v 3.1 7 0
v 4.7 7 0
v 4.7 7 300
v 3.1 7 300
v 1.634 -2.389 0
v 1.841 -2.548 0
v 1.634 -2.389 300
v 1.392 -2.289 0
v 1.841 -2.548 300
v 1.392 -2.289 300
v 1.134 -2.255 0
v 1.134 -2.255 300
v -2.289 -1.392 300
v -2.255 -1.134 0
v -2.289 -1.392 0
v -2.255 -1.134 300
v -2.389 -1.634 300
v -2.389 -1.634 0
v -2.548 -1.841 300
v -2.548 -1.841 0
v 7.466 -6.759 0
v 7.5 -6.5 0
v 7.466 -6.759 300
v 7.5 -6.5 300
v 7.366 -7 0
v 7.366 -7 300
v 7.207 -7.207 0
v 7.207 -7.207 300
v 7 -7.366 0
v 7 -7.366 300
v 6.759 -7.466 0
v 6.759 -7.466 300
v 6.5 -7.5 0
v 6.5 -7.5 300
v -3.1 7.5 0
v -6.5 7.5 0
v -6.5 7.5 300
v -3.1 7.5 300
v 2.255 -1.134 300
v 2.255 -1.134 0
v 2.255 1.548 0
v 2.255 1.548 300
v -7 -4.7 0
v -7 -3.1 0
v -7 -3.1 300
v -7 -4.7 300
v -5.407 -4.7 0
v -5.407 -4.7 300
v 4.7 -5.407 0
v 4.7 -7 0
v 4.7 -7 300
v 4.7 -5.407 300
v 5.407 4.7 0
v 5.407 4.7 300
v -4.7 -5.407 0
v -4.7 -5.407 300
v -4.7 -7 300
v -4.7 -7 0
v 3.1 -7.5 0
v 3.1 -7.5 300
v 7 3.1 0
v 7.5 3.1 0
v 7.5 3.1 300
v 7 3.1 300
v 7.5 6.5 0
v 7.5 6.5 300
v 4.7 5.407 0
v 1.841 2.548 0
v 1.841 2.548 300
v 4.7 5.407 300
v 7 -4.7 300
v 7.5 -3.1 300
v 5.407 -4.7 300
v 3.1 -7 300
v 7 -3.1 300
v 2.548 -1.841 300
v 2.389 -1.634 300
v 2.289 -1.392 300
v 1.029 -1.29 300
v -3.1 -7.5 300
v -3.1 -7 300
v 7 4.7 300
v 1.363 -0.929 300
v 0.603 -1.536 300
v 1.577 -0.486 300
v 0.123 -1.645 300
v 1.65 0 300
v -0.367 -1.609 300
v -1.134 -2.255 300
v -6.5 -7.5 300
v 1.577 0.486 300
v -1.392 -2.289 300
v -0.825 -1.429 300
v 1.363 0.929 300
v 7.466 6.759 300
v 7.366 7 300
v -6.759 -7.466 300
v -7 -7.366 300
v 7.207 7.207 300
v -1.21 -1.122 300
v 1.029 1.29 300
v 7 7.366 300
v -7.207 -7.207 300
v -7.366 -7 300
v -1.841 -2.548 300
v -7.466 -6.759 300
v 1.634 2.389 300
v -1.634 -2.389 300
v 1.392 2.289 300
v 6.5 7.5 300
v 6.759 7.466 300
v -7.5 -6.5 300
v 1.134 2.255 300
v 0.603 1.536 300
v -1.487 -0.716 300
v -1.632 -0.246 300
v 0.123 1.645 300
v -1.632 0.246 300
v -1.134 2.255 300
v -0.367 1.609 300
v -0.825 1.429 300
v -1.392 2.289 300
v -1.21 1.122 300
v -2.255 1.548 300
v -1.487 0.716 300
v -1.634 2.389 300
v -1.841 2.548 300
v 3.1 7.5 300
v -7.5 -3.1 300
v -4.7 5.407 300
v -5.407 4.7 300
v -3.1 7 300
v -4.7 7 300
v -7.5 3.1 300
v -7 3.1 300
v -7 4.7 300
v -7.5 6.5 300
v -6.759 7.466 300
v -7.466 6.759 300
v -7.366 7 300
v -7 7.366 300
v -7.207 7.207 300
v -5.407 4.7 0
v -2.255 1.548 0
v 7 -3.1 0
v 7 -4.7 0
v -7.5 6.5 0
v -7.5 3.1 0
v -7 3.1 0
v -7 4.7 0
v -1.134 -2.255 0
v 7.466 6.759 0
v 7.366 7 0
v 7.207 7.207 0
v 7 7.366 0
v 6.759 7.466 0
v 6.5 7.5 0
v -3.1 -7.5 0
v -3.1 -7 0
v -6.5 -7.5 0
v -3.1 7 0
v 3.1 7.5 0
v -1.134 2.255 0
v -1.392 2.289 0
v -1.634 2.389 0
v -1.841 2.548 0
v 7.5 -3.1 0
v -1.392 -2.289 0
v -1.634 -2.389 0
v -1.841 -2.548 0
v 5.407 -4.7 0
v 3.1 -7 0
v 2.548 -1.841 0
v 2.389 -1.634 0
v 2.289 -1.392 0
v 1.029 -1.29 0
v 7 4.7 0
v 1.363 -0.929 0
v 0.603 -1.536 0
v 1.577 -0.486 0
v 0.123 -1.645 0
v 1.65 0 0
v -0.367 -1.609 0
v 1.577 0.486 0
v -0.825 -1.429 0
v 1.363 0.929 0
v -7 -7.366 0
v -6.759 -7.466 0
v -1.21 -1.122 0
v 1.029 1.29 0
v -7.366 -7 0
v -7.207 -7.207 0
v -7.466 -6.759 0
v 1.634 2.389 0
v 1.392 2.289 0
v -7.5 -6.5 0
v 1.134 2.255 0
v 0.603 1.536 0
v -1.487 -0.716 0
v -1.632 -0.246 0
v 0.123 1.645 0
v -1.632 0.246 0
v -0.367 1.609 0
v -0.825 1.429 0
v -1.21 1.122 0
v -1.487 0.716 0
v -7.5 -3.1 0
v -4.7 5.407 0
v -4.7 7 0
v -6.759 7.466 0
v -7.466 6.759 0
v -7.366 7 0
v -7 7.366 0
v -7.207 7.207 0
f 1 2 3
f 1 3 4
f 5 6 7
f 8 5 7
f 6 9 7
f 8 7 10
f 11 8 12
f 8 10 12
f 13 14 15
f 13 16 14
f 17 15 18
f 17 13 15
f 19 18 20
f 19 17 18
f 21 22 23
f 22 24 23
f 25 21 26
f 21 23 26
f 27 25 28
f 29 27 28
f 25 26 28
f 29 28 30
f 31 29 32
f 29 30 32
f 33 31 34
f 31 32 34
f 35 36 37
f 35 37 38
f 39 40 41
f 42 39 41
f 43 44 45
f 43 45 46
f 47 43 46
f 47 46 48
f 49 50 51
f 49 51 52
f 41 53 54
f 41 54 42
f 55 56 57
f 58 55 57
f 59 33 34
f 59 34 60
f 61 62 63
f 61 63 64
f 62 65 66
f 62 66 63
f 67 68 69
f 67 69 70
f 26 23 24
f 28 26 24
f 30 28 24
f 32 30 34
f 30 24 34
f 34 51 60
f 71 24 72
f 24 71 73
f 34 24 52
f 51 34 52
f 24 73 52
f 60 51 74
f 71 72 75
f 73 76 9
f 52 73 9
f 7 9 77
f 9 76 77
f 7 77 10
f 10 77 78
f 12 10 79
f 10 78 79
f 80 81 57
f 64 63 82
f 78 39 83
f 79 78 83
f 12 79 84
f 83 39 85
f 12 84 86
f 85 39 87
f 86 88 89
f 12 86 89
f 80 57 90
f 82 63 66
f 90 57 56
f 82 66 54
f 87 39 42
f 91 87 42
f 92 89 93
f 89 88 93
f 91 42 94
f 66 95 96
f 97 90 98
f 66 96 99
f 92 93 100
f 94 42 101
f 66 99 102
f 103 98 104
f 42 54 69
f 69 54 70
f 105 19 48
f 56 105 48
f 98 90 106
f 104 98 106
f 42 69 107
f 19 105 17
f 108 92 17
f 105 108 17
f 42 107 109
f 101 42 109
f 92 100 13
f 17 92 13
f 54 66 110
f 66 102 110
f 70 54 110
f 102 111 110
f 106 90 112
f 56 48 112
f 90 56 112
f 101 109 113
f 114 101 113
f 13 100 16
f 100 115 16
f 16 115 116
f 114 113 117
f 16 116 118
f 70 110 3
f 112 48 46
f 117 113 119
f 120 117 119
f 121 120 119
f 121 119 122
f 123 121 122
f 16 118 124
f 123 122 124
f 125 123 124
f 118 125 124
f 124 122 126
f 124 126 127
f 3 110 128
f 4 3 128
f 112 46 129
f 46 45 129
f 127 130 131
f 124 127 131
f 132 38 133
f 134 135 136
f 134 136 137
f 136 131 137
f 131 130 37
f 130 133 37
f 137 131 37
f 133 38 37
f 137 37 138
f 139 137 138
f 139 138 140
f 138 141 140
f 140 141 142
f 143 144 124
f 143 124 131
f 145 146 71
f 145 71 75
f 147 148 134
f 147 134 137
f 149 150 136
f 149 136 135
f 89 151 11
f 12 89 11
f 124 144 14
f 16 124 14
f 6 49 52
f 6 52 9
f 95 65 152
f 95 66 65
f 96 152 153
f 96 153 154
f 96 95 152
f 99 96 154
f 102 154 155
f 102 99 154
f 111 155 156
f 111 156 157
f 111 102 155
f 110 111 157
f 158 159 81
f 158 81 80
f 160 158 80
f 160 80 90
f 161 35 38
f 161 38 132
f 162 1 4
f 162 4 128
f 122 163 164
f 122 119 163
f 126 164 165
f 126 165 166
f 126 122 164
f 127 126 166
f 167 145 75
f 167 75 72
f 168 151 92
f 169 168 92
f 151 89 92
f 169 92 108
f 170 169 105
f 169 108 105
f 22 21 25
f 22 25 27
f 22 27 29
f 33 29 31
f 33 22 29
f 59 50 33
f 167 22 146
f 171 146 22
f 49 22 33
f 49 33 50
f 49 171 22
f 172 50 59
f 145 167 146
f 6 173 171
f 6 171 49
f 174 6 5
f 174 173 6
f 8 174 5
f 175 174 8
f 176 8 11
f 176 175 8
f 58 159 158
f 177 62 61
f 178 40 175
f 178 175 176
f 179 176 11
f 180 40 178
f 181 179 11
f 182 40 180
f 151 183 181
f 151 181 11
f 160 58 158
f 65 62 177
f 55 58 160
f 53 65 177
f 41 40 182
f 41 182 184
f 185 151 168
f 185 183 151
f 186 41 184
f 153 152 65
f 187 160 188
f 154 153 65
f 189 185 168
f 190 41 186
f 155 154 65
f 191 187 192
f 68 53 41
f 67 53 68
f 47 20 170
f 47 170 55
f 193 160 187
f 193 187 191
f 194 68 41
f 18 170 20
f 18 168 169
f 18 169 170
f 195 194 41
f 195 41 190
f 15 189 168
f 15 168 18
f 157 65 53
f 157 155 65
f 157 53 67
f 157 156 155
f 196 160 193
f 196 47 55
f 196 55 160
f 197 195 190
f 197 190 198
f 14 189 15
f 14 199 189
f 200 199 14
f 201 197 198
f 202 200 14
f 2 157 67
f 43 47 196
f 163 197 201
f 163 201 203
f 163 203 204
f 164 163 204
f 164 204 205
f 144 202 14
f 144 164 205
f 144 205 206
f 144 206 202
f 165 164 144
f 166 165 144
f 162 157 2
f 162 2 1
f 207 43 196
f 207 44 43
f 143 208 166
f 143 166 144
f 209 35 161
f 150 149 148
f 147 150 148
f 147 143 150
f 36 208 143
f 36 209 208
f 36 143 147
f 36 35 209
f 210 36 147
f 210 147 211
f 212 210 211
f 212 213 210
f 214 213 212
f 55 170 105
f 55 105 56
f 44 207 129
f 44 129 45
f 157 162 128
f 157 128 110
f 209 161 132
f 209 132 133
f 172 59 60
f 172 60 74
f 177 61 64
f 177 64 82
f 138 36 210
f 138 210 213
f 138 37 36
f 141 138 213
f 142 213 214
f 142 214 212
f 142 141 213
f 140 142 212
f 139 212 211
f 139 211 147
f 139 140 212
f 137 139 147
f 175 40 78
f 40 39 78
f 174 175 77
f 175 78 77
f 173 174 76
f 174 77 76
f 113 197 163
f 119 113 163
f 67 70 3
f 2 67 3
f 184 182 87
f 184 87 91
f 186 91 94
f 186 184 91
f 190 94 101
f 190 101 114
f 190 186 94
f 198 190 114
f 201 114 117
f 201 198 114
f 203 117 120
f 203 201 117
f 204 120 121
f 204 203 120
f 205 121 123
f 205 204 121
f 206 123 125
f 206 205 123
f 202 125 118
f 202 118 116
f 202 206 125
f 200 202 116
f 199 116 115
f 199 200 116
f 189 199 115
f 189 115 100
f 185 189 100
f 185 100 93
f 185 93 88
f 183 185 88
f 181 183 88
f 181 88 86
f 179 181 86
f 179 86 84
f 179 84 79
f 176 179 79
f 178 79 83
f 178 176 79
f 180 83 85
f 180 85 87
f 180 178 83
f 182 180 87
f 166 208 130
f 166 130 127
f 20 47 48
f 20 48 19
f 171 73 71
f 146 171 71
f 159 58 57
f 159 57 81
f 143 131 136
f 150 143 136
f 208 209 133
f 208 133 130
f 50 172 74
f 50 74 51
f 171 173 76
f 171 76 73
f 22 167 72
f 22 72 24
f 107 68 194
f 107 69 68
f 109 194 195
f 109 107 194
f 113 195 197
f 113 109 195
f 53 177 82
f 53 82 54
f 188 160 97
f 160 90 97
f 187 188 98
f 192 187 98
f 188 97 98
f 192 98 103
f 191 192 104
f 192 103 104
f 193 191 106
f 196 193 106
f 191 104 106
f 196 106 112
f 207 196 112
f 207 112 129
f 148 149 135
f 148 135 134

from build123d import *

# Parameters (mm, degrees)
SKETCH_1_R      = 1.65
EXTRUDE_1_DEPTH = 300
FILLET_1_R      = 1


with BuildPart() as part:
    # 草图1 → 凸台-拉伸1 (new body)
    with BuildSketch(Plane.XY):
        Polygon((7.5, 7.5), (7.5, 3.1), (7, 3.1), (7, 4.7), (5.407106781, 4.7), (2.254923973, 1.547817192), (2.254923973, 0), (2.254923973, -1.547817192), (5.407106781, -4.7), (7, -4.7), (7, -3.1), (7.5, -3.1), (7.5, -7.5), (3.1, -7.5), (3.1, -7), (4.7, -7), (4.7, -5.407106781), (1.547817192, -2.254923973), (0, -2.254923973), (-1.547817192, -2.254923973), (-4.7, -5.407106781), (-4.7, -7), (-3.1, -7), (-3.1, -7.5), (-7.5, -7.5), (-7.5, -3.1), (-7, -3.1), (-7, -4.7), (-5.407106781, -4.7), (-2.254923973, -1.547817192), (-2.254923973, 0), (-2.254923973, 1.547817192), (-5.407106781, 4.7), (-7, 4.7), (-7, 3.1), (-7.5, 3.1), (-7.5, 7.5), (-3.1, 7.5), (-3.1, 7), (-4.7, 7), (-4.7, 5.407106781), (-1.547817192, 2.254923973), (0, 2.254923973), (1.547817192, 2.254923973), (4.7, 5.407106781), (4.7, 7), (3.1, 7), (3.1, 7.5), align=None)
        Circle(SKETCH_1_R, mode=Mode.SUBTRACT)
    extrude(amount=EXTRUDE_1_DEPTH)

    # 圆角1
    fillet_1_edges = [part.edges().sort_by_distance(p)[0] for p in [
        (7.5, 7.5, 150),
        (2.254923973, -1.547817192, 150),
        (7.5, -7.5, 150),
        (1.547817192, -2.254923973, 150),
        (-1.547817192, -2.254923973, 150),
        (-7.5, -7.5, 150),
        (-2.254923973, -1.547817192, 150),
        (-7.5, 7.5, 150),
        (-1.547817192, 2.254923973, 150),
        (1.547817192, 2.254923973, 150),
    ]]
    fillet(fillet_1_edges, radius=FILLET_1_R)


solid = part.part
